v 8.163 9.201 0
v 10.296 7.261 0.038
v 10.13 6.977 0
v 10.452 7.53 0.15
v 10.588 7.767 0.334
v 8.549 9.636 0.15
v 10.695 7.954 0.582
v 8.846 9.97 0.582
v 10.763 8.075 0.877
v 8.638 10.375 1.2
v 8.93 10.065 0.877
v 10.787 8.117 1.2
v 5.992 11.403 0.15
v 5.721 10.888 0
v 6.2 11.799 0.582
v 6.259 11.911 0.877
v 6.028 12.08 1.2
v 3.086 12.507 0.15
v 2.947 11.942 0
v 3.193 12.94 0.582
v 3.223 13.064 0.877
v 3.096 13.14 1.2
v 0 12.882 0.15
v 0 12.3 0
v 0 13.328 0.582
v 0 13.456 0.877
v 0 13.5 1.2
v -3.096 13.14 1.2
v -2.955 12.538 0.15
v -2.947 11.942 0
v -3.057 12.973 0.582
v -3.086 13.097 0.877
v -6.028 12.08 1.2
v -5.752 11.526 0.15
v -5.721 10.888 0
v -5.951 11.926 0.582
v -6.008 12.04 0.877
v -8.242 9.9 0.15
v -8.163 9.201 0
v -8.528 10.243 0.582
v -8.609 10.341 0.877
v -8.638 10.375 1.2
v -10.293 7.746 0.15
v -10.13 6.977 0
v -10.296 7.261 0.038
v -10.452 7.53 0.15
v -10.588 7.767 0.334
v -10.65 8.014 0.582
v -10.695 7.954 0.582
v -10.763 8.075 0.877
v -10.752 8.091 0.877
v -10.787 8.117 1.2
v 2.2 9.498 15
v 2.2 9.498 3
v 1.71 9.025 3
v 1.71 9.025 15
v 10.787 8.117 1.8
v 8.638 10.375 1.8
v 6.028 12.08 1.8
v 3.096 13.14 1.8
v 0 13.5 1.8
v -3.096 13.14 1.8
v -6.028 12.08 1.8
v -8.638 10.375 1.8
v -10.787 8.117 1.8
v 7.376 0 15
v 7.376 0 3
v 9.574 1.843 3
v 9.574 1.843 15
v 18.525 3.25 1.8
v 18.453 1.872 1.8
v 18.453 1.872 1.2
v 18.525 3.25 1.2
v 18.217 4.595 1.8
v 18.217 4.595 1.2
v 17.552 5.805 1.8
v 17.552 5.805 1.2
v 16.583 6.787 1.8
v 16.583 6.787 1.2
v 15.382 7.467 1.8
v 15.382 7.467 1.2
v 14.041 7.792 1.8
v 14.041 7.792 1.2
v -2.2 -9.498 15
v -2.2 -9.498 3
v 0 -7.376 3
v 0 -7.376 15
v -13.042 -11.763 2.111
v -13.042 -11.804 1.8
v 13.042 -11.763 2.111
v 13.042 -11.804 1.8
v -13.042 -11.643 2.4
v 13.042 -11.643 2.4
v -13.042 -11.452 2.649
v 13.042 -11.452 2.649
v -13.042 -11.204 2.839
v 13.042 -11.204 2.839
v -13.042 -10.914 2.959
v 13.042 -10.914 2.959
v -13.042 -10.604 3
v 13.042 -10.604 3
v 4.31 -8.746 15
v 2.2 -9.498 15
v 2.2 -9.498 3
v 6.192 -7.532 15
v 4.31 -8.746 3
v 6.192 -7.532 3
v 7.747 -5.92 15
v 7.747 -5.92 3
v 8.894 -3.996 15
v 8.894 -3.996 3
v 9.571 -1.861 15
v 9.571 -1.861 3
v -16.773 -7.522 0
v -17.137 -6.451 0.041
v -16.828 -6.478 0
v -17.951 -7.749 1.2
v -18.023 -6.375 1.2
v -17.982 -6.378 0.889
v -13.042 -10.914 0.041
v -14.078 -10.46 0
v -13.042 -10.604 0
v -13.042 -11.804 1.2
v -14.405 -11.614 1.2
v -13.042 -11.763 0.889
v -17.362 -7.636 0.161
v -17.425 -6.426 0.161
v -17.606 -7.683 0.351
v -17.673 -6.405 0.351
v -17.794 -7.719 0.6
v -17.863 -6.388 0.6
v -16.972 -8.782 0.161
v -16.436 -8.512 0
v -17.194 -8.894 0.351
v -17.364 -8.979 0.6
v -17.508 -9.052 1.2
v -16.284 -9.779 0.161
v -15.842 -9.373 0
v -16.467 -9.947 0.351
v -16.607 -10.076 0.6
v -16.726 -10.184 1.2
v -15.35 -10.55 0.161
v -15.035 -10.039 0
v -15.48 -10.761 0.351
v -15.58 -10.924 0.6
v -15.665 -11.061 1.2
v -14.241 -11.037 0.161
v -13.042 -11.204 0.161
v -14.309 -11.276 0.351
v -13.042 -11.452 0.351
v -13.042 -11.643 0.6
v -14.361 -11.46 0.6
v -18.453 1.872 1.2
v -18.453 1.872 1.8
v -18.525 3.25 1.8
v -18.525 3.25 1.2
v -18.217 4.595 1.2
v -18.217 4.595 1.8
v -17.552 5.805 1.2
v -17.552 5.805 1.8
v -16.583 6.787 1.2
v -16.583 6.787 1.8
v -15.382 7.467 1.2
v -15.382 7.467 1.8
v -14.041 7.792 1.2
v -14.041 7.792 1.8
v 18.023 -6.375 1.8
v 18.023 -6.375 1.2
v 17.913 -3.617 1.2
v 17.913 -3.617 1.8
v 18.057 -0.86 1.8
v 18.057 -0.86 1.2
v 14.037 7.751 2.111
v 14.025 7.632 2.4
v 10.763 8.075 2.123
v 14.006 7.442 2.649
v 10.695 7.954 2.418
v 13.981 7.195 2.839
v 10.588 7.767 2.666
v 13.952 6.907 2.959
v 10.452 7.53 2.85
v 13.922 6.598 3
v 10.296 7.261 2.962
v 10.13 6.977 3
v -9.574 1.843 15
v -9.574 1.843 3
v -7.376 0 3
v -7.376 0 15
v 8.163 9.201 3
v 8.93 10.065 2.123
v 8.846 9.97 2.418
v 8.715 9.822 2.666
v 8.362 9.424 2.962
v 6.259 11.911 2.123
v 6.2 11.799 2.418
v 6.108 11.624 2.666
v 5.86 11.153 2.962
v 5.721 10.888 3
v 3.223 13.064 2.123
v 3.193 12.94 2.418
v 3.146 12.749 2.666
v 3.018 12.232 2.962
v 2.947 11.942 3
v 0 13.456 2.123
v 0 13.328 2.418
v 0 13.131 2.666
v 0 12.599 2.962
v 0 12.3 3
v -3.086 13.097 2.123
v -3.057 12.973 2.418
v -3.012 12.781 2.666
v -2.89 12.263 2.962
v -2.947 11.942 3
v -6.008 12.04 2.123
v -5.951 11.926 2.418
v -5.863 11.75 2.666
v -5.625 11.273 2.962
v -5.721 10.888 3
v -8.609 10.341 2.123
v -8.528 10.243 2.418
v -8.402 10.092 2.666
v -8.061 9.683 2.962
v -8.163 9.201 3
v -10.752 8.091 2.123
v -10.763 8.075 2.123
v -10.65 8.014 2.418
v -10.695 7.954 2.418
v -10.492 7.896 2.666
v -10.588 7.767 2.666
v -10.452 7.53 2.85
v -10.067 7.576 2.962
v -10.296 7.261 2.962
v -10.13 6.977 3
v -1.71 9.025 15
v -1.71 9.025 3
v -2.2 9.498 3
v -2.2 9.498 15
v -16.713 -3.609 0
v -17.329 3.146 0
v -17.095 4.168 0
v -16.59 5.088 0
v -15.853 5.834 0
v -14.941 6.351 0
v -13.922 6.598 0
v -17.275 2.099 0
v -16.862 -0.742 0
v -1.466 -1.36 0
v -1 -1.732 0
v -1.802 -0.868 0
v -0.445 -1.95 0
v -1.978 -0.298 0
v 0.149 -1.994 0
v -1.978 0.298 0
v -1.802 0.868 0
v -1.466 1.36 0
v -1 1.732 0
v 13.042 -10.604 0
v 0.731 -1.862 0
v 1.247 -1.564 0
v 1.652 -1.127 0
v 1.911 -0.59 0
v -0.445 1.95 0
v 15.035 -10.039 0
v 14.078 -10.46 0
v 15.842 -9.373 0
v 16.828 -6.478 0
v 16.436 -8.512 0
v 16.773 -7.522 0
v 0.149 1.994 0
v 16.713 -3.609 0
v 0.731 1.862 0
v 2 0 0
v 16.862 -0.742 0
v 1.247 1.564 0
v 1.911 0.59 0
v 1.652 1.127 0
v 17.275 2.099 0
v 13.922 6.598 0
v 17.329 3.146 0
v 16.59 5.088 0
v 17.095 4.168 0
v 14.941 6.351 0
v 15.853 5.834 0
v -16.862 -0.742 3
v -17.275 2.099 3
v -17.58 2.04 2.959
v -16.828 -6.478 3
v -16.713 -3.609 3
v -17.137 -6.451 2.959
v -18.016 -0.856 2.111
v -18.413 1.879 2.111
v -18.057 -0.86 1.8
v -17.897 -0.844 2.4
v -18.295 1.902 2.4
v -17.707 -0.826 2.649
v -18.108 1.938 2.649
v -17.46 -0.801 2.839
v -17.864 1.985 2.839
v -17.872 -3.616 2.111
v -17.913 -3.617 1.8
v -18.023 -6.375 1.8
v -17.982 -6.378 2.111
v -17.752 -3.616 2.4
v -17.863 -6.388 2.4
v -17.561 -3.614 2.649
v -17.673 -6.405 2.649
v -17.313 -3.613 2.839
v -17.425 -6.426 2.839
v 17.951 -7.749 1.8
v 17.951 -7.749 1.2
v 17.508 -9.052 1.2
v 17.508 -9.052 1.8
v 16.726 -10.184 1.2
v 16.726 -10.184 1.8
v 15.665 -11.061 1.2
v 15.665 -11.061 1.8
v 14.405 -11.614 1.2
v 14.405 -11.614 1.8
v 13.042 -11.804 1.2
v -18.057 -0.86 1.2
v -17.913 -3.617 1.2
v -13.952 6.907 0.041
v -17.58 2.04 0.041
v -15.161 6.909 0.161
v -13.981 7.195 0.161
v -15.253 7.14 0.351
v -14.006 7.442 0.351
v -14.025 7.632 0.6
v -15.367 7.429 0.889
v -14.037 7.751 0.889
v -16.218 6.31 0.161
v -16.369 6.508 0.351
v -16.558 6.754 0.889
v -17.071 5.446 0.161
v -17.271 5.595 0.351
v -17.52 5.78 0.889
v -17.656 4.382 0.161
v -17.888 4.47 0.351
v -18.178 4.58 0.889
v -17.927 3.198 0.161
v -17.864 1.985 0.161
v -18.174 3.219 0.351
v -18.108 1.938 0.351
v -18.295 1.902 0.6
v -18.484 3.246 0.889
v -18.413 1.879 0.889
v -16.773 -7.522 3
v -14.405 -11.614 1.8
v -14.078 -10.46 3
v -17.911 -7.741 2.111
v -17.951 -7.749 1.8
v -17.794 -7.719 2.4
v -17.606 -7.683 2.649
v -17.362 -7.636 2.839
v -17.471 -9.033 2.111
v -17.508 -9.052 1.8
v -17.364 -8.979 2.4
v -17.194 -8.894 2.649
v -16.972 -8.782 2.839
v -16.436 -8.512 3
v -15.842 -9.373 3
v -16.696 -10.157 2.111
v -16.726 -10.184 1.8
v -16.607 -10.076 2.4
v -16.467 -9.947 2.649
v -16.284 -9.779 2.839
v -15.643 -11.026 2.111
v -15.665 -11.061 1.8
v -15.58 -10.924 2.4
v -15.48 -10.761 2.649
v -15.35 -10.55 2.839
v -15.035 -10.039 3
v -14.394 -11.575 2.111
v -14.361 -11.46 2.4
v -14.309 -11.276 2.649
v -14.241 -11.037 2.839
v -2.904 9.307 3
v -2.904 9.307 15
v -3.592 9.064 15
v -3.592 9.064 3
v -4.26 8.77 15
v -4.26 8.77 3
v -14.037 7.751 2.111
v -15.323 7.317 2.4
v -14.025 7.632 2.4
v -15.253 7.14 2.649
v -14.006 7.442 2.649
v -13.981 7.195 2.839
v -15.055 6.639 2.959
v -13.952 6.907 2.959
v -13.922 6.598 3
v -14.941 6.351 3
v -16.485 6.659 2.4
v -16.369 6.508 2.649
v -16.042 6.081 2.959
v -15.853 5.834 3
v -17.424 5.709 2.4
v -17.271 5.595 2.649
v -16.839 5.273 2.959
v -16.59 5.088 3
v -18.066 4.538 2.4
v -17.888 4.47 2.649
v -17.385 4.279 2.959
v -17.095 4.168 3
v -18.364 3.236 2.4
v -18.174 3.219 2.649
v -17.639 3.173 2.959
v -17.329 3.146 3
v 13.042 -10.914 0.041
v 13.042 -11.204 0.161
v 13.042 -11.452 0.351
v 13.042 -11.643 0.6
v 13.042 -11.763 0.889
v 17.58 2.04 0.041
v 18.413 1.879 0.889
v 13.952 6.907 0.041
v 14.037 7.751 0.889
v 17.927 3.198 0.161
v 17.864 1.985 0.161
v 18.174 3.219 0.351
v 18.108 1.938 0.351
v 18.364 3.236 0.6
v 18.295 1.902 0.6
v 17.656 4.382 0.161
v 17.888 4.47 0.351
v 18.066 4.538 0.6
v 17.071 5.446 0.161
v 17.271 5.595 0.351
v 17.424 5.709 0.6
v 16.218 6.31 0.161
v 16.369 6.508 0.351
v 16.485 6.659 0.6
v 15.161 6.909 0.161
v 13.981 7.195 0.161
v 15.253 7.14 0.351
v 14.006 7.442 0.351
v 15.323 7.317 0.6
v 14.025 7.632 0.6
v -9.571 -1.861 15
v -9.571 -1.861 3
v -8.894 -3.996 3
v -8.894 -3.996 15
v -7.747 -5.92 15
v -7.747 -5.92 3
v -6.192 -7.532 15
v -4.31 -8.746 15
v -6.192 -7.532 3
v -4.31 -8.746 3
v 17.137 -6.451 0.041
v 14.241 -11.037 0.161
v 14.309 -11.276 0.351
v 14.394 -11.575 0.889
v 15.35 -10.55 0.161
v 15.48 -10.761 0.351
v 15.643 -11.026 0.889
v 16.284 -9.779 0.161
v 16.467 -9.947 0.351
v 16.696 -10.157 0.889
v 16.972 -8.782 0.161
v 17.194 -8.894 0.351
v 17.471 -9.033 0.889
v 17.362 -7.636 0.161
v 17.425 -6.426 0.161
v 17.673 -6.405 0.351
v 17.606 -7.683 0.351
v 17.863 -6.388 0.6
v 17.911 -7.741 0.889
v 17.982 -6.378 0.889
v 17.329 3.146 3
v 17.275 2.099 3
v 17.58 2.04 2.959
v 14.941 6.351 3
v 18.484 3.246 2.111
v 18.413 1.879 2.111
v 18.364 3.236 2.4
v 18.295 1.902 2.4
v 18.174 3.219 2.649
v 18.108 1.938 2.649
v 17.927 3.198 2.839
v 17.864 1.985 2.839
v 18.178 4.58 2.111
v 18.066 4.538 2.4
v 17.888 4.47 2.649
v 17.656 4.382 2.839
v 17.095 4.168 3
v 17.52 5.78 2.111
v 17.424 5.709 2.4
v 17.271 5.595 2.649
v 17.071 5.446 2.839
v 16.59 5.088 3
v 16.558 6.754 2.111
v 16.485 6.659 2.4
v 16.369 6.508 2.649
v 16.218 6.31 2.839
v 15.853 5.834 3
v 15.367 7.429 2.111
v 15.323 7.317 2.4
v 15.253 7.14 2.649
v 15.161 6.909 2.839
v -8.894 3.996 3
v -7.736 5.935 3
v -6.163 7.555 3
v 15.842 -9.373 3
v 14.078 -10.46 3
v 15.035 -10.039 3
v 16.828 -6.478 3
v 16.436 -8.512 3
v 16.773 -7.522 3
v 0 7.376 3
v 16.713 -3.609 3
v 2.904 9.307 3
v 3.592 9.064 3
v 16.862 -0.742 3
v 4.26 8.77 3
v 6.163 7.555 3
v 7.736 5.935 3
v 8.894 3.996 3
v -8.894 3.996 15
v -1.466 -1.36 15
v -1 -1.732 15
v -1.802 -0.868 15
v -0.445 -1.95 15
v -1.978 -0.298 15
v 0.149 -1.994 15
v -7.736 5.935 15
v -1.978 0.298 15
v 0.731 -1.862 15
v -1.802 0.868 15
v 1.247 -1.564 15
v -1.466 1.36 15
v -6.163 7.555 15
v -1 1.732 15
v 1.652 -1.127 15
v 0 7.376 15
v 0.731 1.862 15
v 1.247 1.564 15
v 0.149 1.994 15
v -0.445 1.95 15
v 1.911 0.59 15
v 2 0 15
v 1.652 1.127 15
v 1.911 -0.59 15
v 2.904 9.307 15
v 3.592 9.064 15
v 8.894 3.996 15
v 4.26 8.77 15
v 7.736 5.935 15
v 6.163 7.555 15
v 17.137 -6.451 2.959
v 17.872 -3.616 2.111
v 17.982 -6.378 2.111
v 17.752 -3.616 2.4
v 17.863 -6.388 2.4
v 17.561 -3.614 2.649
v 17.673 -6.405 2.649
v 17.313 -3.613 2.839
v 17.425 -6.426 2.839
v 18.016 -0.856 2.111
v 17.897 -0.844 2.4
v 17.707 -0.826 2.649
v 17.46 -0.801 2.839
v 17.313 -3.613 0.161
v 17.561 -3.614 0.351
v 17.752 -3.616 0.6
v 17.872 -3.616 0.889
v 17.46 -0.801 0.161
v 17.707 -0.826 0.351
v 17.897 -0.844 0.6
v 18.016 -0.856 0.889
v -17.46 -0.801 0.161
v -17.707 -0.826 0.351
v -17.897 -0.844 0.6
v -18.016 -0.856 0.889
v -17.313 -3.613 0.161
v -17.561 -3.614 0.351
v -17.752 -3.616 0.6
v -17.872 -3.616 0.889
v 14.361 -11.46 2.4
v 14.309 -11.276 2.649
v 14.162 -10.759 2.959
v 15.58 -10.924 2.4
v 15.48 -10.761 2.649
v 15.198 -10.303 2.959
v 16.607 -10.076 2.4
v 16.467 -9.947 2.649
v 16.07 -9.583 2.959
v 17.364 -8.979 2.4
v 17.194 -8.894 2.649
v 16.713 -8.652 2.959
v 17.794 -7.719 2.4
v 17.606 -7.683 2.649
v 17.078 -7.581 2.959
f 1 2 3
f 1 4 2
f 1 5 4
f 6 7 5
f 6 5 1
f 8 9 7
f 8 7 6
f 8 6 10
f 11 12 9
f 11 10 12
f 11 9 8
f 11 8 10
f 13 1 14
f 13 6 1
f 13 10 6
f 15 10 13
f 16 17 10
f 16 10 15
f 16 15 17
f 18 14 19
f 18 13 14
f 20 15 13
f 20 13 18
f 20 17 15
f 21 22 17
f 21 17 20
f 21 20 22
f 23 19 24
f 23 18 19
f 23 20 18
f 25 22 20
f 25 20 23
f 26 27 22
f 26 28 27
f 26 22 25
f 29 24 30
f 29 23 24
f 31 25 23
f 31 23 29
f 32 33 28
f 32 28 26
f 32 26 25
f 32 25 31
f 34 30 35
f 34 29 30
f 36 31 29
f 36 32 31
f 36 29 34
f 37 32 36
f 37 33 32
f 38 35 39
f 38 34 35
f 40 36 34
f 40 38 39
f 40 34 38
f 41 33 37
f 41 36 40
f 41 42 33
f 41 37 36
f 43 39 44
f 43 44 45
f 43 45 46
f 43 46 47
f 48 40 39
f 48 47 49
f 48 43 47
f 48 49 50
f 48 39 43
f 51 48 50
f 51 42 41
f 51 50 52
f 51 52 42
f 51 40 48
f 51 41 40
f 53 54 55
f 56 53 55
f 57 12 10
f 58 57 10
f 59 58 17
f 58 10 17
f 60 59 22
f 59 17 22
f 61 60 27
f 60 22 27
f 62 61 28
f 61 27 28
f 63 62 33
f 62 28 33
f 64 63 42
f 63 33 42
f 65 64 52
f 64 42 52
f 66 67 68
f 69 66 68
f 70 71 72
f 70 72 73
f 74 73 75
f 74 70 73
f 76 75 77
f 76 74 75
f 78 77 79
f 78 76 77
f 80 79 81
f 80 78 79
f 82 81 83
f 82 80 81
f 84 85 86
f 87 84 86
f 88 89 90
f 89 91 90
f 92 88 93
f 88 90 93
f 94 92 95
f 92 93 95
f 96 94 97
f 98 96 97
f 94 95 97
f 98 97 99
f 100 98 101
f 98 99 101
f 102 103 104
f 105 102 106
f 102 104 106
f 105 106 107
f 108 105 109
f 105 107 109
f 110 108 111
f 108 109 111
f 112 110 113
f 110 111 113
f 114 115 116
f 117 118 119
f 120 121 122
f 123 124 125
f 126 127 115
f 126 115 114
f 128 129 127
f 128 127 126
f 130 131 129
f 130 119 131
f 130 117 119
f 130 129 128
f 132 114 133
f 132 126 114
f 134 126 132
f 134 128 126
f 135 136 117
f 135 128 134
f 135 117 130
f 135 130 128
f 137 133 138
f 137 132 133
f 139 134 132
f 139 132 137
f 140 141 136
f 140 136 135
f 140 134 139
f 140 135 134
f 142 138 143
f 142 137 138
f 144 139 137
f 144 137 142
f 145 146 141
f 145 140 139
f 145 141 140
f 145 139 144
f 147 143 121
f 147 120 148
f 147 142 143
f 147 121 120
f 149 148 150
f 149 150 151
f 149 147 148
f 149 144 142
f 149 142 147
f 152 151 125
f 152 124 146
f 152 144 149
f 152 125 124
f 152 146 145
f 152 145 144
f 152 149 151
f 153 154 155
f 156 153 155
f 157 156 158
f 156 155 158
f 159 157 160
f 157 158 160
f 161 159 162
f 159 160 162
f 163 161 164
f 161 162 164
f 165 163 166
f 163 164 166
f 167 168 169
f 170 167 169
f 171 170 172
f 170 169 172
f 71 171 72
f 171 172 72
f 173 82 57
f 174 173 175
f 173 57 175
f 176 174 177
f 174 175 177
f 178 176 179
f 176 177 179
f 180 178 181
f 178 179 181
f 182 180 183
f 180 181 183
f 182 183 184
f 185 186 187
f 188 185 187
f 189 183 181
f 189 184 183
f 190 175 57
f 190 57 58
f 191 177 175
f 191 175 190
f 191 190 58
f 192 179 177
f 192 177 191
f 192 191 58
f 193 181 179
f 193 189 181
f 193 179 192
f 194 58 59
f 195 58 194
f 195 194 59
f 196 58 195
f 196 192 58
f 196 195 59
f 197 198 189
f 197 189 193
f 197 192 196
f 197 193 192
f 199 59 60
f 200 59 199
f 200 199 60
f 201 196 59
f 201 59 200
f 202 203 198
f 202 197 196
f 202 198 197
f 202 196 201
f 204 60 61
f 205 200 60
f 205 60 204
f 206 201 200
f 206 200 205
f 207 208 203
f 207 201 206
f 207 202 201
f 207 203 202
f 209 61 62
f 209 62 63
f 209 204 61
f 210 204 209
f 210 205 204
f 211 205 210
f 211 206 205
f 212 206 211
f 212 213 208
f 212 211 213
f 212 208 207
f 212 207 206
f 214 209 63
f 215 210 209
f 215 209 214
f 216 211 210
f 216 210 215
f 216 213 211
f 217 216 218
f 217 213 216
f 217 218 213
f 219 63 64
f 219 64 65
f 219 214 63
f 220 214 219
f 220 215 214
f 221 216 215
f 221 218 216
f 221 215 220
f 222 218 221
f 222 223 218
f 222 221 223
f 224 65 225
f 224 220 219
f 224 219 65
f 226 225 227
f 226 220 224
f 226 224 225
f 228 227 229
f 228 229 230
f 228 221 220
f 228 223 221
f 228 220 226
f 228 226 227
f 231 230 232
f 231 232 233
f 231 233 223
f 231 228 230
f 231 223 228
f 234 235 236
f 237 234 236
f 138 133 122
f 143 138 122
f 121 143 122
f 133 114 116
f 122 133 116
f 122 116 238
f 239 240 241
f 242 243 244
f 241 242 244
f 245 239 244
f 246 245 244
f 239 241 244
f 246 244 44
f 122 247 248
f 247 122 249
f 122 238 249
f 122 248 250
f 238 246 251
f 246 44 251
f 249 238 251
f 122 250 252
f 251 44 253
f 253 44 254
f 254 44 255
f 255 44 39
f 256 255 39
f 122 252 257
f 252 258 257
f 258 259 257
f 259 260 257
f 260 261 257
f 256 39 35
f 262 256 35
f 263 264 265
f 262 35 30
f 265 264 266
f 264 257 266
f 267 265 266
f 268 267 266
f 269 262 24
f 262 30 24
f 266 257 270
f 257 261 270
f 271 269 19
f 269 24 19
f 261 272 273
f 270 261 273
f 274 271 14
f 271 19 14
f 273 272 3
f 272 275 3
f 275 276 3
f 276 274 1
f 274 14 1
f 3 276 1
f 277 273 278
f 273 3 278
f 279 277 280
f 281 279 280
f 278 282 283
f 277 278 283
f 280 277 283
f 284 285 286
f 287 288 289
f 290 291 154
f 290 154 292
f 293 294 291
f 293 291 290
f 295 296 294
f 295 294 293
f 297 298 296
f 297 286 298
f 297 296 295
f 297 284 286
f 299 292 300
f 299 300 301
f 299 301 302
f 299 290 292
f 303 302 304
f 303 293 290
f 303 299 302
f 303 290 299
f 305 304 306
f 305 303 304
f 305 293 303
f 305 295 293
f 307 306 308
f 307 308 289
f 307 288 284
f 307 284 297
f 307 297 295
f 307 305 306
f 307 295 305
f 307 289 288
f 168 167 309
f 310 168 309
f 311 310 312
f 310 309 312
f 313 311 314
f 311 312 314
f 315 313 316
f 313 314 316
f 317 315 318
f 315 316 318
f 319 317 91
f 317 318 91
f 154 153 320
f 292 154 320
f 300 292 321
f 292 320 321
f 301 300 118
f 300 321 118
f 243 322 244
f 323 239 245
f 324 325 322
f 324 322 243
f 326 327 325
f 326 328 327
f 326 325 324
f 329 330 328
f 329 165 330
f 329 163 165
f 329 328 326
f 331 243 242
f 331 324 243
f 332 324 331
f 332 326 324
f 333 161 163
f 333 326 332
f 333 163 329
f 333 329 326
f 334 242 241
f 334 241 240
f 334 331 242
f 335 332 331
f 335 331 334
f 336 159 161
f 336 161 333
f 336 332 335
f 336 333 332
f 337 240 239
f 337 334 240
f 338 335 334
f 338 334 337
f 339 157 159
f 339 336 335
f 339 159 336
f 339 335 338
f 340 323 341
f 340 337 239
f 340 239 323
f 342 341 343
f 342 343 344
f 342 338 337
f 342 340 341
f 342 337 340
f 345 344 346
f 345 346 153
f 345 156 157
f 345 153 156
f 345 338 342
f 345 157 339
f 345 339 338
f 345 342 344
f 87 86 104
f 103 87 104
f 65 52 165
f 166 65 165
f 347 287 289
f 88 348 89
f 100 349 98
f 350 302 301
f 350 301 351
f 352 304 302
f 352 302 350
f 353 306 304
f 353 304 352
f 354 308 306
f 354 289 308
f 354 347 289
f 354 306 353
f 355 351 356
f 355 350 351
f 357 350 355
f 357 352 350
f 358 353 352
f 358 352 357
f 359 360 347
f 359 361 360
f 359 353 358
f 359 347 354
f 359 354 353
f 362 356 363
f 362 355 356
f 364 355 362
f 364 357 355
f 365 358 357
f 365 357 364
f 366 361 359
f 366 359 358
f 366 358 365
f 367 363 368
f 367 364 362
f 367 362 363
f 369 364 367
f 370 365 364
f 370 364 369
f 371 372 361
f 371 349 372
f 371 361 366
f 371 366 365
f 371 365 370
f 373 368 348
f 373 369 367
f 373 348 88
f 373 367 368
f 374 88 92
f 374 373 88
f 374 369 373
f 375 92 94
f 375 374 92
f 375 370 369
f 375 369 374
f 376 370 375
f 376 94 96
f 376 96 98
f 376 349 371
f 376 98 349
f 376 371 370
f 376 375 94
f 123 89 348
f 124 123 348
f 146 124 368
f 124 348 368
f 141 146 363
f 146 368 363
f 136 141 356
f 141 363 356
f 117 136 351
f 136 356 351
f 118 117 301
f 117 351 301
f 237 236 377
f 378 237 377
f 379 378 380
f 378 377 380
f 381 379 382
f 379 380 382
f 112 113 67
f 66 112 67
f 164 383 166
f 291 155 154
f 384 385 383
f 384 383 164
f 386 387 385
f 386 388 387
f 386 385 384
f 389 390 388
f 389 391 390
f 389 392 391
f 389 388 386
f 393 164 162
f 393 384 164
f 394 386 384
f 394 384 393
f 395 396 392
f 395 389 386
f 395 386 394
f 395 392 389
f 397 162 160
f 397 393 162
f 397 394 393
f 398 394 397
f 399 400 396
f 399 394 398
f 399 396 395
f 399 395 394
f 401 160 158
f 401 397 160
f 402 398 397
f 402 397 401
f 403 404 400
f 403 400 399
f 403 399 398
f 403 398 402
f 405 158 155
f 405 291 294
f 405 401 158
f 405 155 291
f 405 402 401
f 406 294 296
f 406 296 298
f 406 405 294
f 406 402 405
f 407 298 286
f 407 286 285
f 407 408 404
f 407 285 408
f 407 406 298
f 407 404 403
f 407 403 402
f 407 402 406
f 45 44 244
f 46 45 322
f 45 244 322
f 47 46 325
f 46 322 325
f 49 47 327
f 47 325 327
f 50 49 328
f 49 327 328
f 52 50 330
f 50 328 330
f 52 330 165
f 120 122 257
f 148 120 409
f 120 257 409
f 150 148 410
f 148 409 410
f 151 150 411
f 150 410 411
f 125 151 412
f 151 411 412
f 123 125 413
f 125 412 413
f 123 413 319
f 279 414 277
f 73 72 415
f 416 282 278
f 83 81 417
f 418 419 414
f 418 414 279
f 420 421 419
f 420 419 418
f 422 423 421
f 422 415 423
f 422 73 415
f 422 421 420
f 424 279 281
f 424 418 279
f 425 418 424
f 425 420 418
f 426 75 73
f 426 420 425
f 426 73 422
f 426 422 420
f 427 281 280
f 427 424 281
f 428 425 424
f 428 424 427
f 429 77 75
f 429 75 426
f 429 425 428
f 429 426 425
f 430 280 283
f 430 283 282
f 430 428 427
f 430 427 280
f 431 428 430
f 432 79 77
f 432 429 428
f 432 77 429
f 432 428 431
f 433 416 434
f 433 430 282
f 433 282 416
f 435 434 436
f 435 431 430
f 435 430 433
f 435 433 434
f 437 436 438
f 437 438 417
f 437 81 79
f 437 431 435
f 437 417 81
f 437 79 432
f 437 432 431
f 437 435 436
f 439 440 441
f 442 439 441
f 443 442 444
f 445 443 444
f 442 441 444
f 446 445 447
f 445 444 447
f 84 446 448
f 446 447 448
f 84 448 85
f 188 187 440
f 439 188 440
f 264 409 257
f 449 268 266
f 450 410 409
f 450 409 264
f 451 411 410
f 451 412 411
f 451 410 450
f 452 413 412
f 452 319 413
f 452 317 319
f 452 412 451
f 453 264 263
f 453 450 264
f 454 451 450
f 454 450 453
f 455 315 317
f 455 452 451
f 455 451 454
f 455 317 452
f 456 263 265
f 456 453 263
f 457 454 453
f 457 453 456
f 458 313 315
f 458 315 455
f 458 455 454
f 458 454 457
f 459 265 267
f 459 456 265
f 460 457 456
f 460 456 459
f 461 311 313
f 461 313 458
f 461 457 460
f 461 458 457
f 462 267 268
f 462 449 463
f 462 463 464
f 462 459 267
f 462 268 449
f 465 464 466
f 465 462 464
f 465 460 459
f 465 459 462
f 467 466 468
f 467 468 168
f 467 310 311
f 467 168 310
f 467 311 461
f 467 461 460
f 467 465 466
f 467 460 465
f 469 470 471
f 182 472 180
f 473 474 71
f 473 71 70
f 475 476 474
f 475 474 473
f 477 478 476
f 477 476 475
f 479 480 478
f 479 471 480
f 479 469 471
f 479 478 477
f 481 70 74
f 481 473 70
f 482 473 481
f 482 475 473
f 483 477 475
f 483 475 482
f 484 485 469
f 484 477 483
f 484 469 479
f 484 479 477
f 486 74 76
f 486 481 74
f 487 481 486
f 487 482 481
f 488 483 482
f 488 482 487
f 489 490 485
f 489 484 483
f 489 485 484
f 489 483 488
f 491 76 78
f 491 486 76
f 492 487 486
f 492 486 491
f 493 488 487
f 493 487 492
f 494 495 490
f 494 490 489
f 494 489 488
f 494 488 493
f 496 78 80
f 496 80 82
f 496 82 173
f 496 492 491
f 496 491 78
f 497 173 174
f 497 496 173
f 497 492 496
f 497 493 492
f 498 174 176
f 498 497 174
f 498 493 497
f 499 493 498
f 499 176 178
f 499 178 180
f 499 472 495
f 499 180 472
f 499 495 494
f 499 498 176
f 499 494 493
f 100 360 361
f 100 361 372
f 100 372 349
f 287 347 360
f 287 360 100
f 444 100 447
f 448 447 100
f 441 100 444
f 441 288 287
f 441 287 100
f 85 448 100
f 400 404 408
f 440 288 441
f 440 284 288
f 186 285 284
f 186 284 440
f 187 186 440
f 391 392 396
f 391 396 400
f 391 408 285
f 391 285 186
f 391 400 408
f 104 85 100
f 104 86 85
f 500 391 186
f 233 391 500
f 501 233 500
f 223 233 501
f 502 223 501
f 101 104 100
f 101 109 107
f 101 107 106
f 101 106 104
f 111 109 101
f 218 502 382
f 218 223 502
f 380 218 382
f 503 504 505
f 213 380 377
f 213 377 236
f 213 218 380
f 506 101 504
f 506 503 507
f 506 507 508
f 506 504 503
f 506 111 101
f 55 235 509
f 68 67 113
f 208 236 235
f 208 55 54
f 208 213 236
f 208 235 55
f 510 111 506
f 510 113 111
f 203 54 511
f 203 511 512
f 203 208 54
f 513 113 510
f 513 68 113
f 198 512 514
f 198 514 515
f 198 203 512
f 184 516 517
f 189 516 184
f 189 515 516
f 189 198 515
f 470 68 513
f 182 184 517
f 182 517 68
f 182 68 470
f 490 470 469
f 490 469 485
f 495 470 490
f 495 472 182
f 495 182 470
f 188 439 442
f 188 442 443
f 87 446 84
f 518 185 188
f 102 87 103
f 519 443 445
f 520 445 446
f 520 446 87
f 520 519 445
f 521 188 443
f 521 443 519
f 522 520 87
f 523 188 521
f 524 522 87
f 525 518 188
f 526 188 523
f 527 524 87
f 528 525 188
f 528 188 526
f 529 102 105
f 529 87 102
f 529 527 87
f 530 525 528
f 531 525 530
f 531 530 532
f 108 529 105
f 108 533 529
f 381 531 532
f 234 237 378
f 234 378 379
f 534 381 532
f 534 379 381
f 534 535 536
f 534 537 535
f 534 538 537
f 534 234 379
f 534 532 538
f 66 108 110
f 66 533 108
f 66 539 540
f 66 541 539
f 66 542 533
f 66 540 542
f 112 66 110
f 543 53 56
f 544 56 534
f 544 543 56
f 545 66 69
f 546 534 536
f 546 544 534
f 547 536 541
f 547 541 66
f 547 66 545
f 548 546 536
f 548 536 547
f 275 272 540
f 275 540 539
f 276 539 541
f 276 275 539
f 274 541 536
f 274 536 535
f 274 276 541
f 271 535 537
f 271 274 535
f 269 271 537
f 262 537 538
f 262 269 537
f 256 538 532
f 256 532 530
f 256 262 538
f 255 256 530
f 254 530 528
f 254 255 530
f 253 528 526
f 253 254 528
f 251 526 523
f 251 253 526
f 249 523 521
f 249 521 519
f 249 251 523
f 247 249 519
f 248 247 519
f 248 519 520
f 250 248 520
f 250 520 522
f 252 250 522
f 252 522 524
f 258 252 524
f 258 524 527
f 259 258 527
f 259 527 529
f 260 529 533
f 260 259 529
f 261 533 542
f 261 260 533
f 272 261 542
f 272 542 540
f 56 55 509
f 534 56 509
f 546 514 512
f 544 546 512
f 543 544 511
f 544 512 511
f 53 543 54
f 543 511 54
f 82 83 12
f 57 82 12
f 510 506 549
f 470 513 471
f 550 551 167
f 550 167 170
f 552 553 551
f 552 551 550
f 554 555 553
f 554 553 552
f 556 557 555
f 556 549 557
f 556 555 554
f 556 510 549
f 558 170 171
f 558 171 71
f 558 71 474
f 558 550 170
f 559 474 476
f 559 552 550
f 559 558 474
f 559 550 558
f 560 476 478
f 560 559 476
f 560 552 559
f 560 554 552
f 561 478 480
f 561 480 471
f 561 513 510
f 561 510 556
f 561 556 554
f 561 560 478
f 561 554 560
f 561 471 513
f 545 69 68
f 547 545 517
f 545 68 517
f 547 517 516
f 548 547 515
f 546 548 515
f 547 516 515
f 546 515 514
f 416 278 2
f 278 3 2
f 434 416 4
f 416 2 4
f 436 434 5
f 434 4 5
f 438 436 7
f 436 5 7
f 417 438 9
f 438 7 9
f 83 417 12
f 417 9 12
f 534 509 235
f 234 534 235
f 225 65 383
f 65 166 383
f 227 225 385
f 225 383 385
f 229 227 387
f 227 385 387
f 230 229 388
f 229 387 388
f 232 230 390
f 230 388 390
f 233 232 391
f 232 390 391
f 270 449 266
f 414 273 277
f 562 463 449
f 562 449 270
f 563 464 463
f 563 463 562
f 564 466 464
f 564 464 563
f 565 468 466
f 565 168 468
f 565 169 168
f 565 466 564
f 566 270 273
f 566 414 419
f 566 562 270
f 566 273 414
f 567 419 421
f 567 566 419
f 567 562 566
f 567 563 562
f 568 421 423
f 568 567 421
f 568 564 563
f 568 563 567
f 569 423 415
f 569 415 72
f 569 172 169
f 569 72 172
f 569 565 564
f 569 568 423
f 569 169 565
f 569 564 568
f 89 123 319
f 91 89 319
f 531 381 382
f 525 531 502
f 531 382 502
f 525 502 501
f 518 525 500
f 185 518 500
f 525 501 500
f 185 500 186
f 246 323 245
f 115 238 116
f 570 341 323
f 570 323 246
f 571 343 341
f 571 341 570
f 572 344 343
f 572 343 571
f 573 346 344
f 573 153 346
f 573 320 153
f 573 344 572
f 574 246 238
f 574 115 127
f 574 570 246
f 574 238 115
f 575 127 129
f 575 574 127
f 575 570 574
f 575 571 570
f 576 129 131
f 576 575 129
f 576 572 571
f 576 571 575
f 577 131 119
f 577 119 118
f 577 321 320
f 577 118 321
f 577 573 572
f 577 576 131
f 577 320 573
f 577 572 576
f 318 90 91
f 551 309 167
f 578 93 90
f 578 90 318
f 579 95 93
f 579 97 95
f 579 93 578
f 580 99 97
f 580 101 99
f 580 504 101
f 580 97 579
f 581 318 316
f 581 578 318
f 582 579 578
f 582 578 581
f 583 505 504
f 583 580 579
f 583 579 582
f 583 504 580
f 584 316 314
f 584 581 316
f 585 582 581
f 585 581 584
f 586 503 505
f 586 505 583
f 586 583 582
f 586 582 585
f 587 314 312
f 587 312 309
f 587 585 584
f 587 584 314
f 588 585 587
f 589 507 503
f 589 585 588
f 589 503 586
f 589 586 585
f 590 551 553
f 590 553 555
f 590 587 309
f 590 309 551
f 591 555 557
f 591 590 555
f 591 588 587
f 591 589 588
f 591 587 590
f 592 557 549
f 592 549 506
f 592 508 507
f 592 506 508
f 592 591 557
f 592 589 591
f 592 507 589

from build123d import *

# Parameters (mm, degrees)
F0_R     = 2
F1_DEPTH = 15
F2_DEPTH = 3
F3_R     = 5
F4_R     = 5
F5_R     = 1.2


with BuildPart() as f1:
    # F0 (on Top) → F1 (new body)
    with BuildSketch(Plane.XY):
        with BuildLine():
            Line((9.5707826587, -1.8608114628), (7.3763099499, 0))
            ThreePointArc((7.3763099499, 0), (5.2158387857, -5.2158387857), (0, -7.3763099499))
            Line((0, -7.3763099499), (2.2002961183, -9.4984839312))
            ThreePointArc((2.2002961183, -9.4984839312), (7.0159164816, -6.770481218), (9.5707826587, -1.8608114628))
        make_face()
        with BuildLine():
            ThreePointArc((0, -7.3763099499), (5.2158387857, -5.2158387857), (7.3763099499, 0))
            ThreePointArc((7.3763099499, 0), (5.2158387857, 5.2158387857), (0, 7.3763099499))
            ThreePointArc((0, 7.3763099499), (-5.2158387857, 5.2158387857), (-7.3763099499, 0))
            ThreePointArc((-7.3763099499, 0), (-5.2158387857, -5.2158387857), (0, -7.3763099499))
        make_face()
        Circle(F0_R, mode=Mode.SUBTRACT)
        with BuildLine():
            ThreePointArc((9.5742217065, 1.8430351908), (7.7357792995, 5.9346624697), (4.2599529151, 8.7701368952))
            Line((4.2599529151, 8.7701368952), (1.7095643673, 9.02517575))
            Line((1.7095643673, 9.02517575), (0, 7.3763099499))
            ThreePointArc((0, 7.3763099499), (5.2158387857, 5.2158387857), (7.3763099499, 0))
            Line((7.3763099499, 0), (9.5742217065, 1.8430351908))
        make_face()
        with BuildLine():
            Line((1.7095643673, 9.02517575), (4.2599529151, 8.7701368952))
            ThreePointArc((4.2599529151, 8.7701368952), (3.2505886766, 9.1921800056), (2.2002961183, 9.4984839312))
            Line((2.2002961183, 9.4984839312), (1.7095643673, 9.02517575))
        make_face()
        with BuildLine():
            Line((-1.7095643673, 9.02517575), (-4.2599529151, 8.7701368952))
            ThreePointArc((-4.2599529151, 8.7701368952), (-7.7357792995, 5.9346624697), (-9.5742217065, 1.8430351908))
            Line((-9.5742217065, 1.8430351908), (-7.3763099499, 0))
            ThreePointArc((-7.3763099499, 0), (-5.2158387857, 5.2158387857), (0, 7.3763099499))
            Line((0, 7.3763099499), (-1.7095643673, 9.02517575))
        make_face()
        with BuildLine():
            ThreePointArc((-2.2002961183, 9.4984839312), (-3.2505886766, 9.1921800056), (-4.2599529151, 8.7701368952))
            Line((-4.2599529151, 8.7701368952), (-1.7095643673, 9.02517575))
            Line((-1.7095643673, 9.02517575), (-2.2002961183, 9.4984839312))
        make_face()
        with BuildLine():
            Line((-7.3763099499, 0), (-9.5707826587, -1.8608114628))
            ThreePointArc((-9.5707826587, -1.8608114628), (-7.0159164816, -6.770481218), (-2.2002961183, -9.4984839312))
            Line((-2.2002961183, -9.4984839312), (0, -7.3763099499))
            ThreePointArc((0, -7.3763099499), (-5.2158387857, -5.2158387857), (-7.3763099499, 0))
        make_face()
    extrude(amount=F1_DEPTH)

    # F0 (on Top) → F2 (join)
    with BuildSketch(Plane.XY):
        with BuildLine():
            Line((4.2599529151, 8.7701368952), (10.7868960269, 8.1174425841))
            ThreePointArc((10.7868960269, 8.1174425841), (0, 13.5), (-10.7868960269, 8.1174425841))
            Line((-10.7868960269, 8.1174425841), (-4.2599529151, 8.7701368952))
            ThreePointArc((-4.2599529151, 8.7701368952), (-3.2505886766, 9.1921800056), (-2.2002961183, 9.4984839312))
            ThreePointArc((-2.2002961183, 9.4984839312), (0, 9.75), (2.2002961183, 9.4984839312))
            ThreePointArc((2.2002961183, 9.4984839312), (3.2505886766, 9.1921800056), (4.2599529151, 8.7701368952))
        make_face()
        Polygon((0, 7.3763099499), (1.7095643673, 9.02517575), (0, 9.1961321867), (-1.7095643673, 9.02517575), align=None)
        with BuildLine():
            Line((1.7095643673, 9.02517575), (2.2002961183, 9.4984839312))
            ThreePointArc((2.2002961183, 9.4984839312), (0, 9.75), (-2.2002961183, 9.4984839312))
            Line((-2.2002961183, 9.4984839312), (-1.7095643673, 9.02517575))
            Line((-1.7095643673, 9.02517575), (0, 9.1961321867))
            Line((0, 9.1961321867), (1.7095643673, 9.02517575))
        make_face()
        with BuildLine():
            ThreePointArc((8.2654431298, -10.6739144585), (12.1209216286, -5.9441785701), (13.5, 0))
            ThreePointArc((13.5, 0), (12.8037708579, 4.2794219024), (10.7868960269, 8.1174425841))
            Line((10.7868960269, 8.1174425841), (4.2599529151, 8.7701368952))
            ThreePointArc((4.2599529151, 8.7701368952), (7.7357792995, 5.9346624697), (9.5742217065, 1.8430351908))
            ThreePointArc((9.5742217065, 1.8430351908), (9.7059559457, 0.9256992928), (9.75, 0))
            ThreePointArc((9.75, 0), (9.7050922438, -0.9347109387), (9.5707826587, -1.8608114628))
            ThreePointArc((9.5707826587, -1.8608114628), (7.0159164816, -6.770481218), (2.2002961183, -9.4984839312))
            ThreePointArc((2.2002961183, -9.4984839312), (0, -9.75), (-2.2002961183, -9.4984839312))
            ThreePointArc((-2.2002961183, -9.4984839312), (-7.0159164816, -6.770481218), (-9.5707826587, -1.8608114628))
            ThreePointArc((-9.5707826587, -1.8608114628), (-9.7499957971, -0.0090529401), (-9.5742217065, 1.8430351908))
            ThreePointArc((-9.5742217065, 1.8430351908), (-7.7357792995, 5.9346624697), (-4.2599529151, 8.7701368952))
            Line((-4.2599529151, 8.7701368952), (-10.7868960269, 8.1174425841))
            ThreePointArc((-10.7868960269, 8.1174425841), (-13.3800852655, -1.7953602115), (-8.2654431298, -10.6739144585))
            Line((-8.2654431298, -10.6739144585), (0, -9.8038678133))
            Line((0, -9.8038678133), (8.2654431298, -10.6739144585))
        make_face()
        with BuildLine():
            ThreePointArc((-8.2654431298, -10.6739144585), (-13.3800852655, -1.7953602115), (-10.7868960269, 8.1174425841))
            Line((-10.7868960269, 8.1174425841), (-20, 7.1961321867))
            ThreePointArc((-20, 7.1961321867), (-17.9538534771, -2.2224916805), (-19, -11.8038678133))
            Line((-19, -11.8038678133), (-8.2654431298, -10.6739144585))
        make_face()
        with BuildLine():
            ThreePointArc((-6.5512368792, -11.8038678133), (-7.4298519681, -11.2715260605), (-8.2654431298, -10.6739144585))
            Line((-8.2654431298, -10.6739144585), (-19, -11.8038678133))
            Line((-19, -11.8038678133), (-6.5512368792, -11.8038678133))
        make_face()
        with BuildLine():
            Line((19, -11.8038678133), (8.2654431298, -10.6739144585))
            ThreePointArc((8.2654431298, -10.6739144585), (7.4298519681, -11.2715260605), (6.5512368792, -11.8038678133))
            Line((6.5512368792, -11.8038678133), (19, -11.8038678133))
        make_face()
        with BuildLine():
            ThreePointArc((6.5512368792, -11.8038678133), (7.4298519681, -11.2715260605), (8.2654431298, -10.6739144585))
            Line((8.2654431298, -10.6739144585), (0, -9.8038678133))
            Line((0, -9.8038678133), (-8.2654431298, -10.6739144585))
            ThreePointArc((-8.2654431298, -10.6739144585), (-7.4298519681, -11.2715260605), (-6.5512368792, -11.8038678133))
            Line((-6.5512368792, -11.8038678133), (6.5512368792, -11.8038678133))
        make_face()
        with BuildLine():
            ThreePointArc((10.7868960269, 8.1174425841), (12.8037708579, 4.2794219024), (13.5, 0))
            ThreePointArc((13.5, 0), (12.1209216286, -5.9441785701), (8.2654431298, -10.6739144585))
            Line((8.2654431298, -10.6739144585), (19, -11.8038678133))
            ThreePointArc((19, -11.8038678133), (17.9538534771, -2.2224916805), (20, 7.1961321867))
            Line((20, 7.1961321867), (10.7868960269, 8.1174425841))
        make_face()
        with BuildLine():
            ThreePointArc((9.75, 0), (9.7059559457, 0.9256992928), (9.5742217065, 1.8430351908))
            Line((9.5742217065, 1.8430351908), (7.3763099499, 0))
            Line((7.3763099499, 0), (9.5707826587, -1.8608114628))
            ThreePointArc((9.5707826587, -1.8608114628), (9.7050922438, -0.9347109387), (9.75, 0))
        make_face()
        with BuildLine():
            Line((-7.3763099499, 0), (-9.5742217065, 1.8430351908))
            ThreePointArc((-9.5742217065, 1.8430351908), (-9.7499957971, -0.0090529401), (-9.5707826587, -1.8608114628))
            Line((-9.5707826587, -1.8608114628), (-7.3763099499, 0))
        make_face()
        with BuildLine():
            Line((2.2002961183, -9.4984839312), (0, -7.3763099499))
            Line((0, -7.3763099499), (-2.2002961183, -9.4984839312))
            ThreePointArc((-2.2002961183, -9.4984839312), (0, -9.75), (2.2002961183, -9.4984839312))
        make_face()
    extrude(amount=F2_DEPTH)

    # F3
    f3_edges = [f1.edges().sort_by_distance(p)[0] for p in [
        (19, -11.803868, 1.5),
    ]]
    fillet(f3_edges, radius=F3_R)

    # F4
    f4_edges = [f1.edges().sort_by_distance(p)[0] for p in [
        (-19, -11.803868, 1.5),
        (20, 7.196132, 1.5),
        (-20, 7.196132, 1.5),
    ]]
    fillet(f4_edges, radius=F4_R)

    # F5
    f5_edges = [f1.edges().sort_by_distance(p)[0] for p in [
        (0, -11.803868, 3),
        (0, 13.5, 3),
        (0, -11.803868, 0),
        (0, 13.5, 0),
    ]]
    fillet(f5_edges, radius=F5_R)


solid = f1.part
